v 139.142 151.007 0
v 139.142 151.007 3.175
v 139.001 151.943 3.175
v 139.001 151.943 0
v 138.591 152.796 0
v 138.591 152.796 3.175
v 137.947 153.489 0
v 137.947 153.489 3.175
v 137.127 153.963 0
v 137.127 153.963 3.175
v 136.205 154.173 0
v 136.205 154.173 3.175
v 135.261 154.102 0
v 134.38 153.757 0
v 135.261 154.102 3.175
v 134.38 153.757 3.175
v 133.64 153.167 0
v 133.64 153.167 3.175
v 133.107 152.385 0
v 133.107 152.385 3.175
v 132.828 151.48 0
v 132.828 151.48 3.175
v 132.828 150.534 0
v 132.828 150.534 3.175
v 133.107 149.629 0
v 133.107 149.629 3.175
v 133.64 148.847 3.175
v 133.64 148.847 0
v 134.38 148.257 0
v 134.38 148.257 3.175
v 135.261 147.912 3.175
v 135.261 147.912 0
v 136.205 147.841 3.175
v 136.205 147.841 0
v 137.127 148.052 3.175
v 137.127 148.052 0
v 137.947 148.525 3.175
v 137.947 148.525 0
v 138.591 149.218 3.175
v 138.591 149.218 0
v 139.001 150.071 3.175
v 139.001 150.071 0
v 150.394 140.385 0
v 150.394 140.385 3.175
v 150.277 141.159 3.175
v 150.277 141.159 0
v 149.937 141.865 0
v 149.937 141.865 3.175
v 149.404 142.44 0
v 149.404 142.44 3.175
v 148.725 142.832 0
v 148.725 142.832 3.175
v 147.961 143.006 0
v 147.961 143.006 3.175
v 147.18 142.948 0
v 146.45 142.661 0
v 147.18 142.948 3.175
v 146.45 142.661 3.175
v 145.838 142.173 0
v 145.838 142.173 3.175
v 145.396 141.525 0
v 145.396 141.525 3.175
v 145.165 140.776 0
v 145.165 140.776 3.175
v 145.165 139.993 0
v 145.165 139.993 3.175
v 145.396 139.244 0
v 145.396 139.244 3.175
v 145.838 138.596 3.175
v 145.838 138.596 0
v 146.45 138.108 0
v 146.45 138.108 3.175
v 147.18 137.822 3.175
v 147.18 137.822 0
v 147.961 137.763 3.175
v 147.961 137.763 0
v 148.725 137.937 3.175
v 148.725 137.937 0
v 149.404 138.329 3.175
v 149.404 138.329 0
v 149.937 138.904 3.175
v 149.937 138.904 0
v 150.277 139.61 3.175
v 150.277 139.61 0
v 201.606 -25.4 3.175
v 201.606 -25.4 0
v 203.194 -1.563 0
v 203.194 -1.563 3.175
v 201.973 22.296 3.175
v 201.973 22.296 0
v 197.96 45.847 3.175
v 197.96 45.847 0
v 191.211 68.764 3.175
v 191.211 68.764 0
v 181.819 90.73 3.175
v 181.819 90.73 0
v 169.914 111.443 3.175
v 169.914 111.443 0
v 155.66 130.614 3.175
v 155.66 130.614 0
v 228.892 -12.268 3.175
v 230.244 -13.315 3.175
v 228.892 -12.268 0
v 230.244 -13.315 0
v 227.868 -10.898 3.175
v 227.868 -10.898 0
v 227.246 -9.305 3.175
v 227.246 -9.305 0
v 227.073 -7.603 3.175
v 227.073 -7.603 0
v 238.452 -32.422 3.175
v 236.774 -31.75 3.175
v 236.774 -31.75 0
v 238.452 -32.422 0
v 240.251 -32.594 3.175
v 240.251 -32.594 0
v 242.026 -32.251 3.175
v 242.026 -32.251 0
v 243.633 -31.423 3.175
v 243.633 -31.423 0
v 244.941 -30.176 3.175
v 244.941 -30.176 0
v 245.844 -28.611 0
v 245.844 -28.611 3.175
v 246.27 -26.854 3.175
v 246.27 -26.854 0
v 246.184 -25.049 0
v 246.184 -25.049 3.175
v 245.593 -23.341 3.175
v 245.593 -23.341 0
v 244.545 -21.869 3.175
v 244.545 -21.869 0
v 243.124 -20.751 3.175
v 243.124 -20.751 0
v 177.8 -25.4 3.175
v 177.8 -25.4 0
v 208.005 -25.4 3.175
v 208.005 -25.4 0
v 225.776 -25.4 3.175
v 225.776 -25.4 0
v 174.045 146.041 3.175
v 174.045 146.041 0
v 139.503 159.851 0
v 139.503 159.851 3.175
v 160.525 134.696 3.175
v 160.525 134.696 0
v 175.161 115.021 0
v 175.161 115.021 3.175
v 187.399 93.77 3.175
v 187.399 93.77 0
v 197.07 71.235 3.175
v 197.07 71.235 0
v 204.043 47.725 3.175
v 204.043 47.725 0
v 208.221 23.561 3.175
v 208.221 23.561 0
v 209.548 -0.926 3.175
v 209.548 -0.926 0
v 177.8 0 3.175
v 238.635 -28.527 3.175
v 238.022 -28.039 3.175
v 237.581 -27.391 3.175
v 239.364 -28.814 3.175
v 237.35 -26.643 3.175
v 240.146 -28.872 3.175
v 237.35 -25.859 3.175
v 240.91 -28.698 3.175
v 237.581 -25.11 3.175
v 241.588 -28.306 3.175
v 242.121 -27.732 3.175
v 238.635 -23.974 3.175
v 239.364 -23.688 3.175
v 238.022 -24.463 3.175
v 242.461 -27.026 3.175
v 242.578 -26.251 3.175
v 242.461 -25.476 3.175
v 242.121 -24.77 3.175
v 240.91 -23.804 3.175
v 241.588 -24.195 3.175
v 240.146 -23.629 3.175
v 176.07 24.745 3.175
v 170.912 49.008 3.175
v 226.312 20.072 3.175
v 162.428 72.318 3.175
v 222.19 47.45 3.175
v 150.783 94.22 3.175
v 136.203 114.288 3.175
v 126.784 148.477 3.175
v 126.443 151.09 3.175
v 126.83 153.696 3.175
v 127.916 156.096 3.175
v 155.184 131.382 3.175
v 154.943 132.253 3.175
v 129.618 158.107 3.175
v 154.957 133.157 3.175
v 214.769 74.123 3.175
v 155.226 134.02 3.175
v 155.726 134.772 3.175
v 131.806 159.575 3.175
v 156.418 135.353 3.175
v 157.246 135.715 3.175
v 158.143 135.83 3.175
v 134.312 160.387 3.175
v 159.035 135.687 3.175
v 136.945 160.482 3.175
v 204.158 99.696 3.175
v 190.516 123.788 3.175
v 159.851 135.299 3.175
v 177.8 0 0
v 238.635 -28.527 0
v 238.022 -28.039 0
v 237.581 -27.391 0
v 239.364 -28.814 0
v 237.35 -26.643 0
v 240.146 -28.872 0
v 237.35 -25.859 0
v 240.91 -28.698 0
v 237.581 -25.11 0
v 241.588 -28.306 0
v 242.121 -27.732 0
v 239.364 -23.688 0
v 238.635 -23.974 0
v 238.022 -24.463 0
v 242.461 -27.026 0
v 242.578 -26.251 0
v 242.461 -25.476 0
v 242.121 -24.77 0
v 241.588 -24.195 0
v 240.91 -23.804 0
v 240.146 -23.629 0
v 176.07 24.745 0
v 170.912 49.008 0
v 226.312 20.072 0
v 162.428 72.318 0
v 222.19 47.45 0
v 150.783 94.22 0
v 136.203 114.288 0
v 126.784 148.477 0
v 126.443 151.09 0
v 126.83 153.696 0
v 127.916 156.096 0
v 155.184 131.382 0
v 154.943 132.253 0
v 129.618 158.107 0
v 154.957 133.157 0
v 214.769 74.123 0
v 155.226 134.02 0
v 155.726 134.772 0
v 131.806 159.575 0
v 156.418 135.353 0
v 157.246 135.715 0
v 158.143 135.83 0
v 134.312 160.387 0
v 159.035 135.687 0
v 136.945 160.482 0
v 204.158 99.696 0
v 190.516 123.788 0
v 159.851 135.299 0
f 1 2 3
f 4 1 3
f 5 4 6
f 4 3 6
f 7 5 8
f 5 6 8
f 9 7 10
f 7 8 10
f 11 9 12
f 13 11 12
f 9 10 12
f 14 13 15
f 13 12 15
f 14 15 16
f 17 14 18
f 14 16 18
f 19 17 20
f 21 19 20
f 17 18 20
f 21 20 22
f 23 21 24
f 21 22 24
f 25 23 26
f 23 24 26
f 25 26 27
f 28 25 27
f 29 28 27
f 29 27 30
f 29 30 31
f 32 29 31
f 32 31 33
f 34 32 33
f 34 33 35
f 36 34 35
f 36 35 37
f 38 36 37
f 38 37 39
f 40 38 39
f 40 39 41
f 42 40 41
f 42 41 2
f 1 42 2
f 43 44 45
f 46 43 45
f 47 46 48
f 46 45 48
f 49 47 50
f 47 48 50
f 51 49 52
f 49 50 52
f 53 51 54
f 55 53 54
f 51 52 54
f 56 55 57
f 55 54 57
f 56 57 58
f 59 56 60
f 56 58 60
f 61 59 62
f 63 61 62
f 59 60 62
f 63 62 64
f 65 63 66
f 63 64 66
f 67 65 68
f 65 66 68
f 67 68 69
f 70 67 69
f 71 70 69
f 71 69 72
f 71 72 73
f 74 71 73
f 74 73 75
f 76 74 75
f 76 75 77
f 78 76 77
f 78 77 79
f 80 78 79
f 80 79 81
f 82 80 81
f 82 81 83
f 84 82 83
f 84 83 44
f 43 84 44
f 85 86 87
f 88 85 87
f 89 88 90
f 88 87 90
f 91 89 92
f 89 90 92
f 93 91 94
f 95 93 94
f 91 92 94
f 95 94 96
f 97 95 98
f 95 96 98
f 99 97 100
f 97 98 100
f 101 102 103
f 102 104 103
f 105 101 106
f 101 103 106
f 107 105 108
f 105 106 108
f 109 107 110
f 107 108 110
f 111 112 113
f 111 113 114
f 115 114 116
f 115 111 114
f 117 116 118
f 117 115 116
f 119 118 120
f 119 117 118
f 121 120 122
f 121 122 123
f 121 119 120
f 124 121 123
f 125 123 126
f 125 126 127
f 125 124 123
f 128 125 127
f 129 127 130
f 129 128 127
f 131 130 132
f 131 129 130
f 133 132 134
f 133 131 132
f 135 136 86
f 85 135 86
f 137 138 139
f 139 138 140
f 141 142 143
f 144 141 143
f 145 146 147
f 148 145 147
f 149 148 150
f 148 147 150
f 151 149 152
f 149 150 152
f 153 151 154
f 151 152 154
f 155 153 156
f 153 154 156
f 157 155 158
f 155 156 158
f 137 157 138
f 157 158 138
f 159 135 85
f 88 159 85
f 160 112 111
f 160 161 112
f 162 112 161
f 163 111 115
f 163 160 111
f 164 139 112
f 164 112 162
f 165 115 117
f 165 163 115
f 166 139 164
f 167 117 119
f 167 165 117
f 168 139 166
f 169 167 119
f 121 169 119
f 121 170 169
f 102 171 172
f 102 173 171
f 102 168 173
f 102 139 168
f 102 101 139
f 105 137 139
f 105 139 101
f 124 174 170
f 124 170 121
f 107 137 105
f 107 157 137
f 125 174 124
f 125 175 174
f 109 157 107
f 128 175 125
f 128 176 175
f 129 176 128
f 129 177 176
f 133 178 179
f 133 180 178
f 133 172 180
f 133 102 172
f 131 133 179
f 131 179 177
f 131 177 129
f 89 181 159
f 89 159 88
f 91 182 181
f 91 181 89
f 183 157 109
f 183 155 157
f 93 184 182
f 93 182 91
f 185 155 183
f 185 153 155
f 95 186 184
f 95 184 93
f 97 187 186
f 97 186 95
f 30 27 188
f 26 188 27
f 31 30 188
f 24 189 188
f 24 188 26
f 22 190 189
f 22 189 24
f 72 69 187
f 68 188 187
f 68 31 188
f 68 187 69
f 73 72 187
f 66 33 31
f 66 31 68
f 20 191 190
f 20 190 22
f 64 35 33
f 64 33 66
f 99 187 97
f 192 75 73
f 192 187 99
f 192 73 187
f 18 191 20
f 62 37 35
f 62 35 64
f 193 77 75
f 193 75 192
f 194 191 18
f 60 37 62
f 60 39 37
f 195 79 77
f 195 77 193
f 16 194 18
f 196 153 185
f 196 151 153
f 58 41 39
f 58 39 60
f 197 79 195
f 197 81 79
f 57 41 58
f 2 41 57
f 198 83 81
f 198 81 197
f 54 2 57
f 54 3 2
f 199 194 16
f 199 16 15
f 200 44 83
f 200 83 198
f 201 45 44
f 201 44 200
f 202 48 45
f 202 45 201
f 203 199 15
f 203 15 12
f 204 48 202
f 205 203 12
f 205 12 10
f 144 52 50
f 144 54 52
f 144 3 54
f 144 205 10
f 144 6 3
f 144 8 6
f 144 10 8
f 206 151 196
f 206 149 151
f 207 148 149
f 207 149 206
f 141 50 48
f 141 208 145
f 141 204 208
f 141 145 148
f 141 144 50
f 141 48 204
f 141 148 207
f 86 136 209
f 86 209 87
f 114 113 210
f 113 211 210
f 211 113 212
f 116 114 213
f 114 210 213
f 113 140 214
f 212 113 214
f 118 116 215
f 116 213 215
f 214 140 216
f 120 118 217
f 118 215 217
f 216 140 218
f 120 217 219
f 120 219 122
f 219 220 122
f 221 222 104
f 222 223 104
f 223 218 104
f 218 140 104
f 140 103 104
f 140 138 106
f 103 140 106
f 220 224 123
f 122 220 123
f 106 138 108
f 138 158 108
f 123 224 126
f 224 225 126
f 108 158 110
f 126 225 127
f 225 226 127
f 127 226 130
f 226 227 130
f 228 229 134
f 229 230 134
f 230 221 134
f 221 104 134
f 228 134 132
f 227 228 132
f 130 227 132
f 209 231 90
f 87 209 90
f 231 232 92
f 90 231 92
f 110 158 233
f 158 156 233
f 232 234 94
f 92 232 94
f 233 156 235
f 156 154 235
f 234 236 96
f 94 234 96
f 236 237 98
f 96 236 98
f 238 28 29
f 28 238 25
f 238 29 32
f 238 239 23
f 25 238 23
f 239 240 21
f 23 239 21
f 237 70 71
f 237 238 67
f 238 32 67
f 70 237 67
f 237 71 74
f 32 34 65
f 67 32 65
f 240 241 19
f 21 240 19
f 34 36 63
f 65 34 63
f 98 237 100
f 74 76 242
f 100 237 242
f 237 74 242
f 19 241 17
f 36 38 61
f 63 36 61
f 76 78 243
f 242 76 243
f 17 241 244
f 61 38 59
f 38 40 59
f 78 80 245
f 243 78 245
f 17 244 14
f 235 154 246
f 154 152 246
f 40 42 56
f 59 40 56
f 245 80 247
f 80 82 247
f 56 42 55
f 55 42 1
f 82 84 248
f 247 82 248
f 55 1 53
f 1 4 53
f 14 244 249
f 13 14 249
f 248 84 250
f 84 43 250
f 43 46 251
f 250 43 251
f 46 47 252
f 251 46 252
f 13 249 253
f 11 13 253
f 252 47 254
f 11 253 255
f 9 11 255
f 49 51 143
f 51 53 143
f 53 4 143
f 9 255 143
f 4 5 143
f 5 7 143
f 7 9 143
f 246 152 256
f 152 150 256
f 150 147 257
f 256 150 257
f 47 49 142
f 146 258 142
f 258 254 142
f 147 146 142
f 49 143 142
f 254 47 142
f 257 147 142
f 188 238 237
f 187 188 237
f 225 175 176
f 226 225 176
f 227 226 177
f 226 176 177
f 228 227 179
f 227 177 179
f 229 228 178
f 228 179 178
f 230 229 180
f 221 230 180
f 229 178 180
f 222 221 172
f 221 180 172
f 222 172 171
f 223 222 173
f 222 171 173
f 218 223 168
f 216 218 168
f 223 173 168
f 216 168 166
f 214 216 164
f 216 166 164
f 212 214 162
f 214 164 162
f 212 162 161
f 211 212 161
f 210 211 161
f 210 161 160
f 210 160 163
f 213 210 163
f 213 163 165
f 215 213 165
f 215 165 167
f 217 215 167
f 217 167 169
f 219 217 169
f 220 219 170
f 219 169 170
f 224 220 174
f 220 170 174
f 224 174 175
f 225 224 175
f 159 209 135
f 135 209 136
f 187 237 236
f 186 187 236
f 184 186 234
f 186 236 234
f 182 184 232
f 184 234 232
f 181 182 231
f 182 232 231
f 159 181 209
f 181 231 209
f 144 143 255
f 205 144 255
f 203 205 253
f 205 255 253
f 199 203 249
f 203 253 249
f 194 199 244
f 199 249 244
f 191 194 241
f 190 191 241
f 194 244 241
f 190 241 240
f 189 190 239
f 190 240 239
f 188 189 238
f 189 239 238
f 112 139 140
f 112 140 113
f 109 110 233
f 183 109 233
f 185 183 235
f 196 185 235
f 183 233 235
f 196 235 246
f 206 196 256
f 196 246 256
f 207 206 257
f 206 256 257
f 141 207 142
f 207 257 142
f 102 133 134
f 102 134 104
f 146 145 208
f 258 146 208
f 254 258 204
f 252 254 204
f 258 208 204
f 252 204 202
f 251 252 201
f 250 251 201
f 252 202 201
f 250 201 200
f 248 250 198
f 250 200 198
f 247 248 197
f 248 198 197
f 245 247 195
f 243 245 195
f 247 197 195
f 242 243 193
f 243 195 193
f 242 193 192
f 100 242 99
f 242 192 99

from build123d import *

# Parameters (mm, degrees)
COPIED_SKETCH_DONT_MESS_WITH_DEPTH = 3.175
SKETCH3_R                          = 3.175
HOLE_FOR_TOP_SUPPORT_BRACING_DEPTH = 4.175
SKETCH4_R                          = 3.175
MAKING_IT_MACHINABLE_DEPTH         = 4.175
SKETCH5_R                          = 2.6289
THING_FOR_HARDSTOP_DEPTH           = 3.175
FILLET1_R                          = 6.35
SKETCH6_R                          = 2.6289
CUT_EXTRUDE1_DEPTH                 = 4.175


with BuildPart() as part:
    # Sketch2 → Copied sketch - dont mess with (new body)
    with BuildSketch(Plane.XY):
        with BuildLine():
            Line((155.660230842, 130.614442288), (160.524613056, 134.69614361))
            ThreePointArc((160.524613056, 134.69614361), (200.900960932, 59.581930119), (208.004909798, -25.4))
            Line((208.004909798, -25.4), (225.775729431, -25.4))
            ThreePointArc((225.775729431, -25.4), (217.513785946, 65.632255207), (174.045297477, 146.041344921))
            Line((174.045297477, 146.041344921), (139.503343029, 159.851365822))
            ThreePointArc((139.503343029, 159.851365822), (129.618020291, 158.107153482), (126.784391338, 148.47738561))
            Line((126.784391338, 148.47738561), (136.202701987, 114.287637002))
            ThreePointArc((136.202701987, 114.287637002), (167.077347976, 60.811181483), (177.8, 0))
            Line((177.8, 0), (177.8, -25.4))
            Line((177.8, -25.4), (201.606249903, -25.4))
            ThreePointArc((201.606249903, -25.4), (194.922962004, 57.404519712), (155.660230842, 130.614442288))
        make_face()
    extrude(amount=COPIED_SKETCH_DONT_MESS_WITH_DEPTH)

    # Sketch3 → Hole for top support bracing (cut, through all)
    with BuildSketch(Plane.XY.offset(3.175)):
        with Locations((135.967339212, 151.007028537)):
            Circle(SKETCH3_R)
    extrude(amount=-HOLE_FOR_TOP_SUPPORT_BRACING_DEPTH, mode=Mode.SUBTRACT)

    # Sketch4 → Making it machinable (cut, through all)
    with BuildSketch(Plane.XY.offset(3.175)):
        with Locations((158.092421949, 132.655292949)):
            Circle(SKETCH4_R)
    extrude(amount=-MAKING_IT_MACHINABLE_DEPTH, mode=Mode.SUBTRACT)

    # Sketch5 → Thing for hardstop (add)
    with BuildSketch(Plane.XY.offset(3.175)):
        with BuildLine():
            Line((225.775729431, -25.4), (236.774252059, -31.75))
            ThreePointArc((236.774252059, -31.75), (245.448513373, -29.425738686), (243.124252059, -20.751477372))
            Line((243.124252059, -20.751477372), (226.914188257, -11.392592672))
            ThreePointArc((226.914188257, -11.392592672), (226.453289353, -18.405100951), (225.775729431, -25.4))
        make_face()
        with Locations((239.949252059, -26.250738686)):
            Circle(SKETCH5_R, mode=Mode.SUBTRACT)
    extrude(amount=-THING_FOR_HARDSTOP_DEPTH)

    # Fillet1
    fillet1_edges = [part.edges().sort_by_distance(p)[0] for p in [
        (226.914188257, -11.392592672, 1.5875),
    ]]
    fillet(fillet1_edges, radius=FILLET1_R)

    # Sketch6 → Cut-Extrude1 (cut, through all)
    with BuildSketch(Plane.XY.offset(3.175)):
        with Locations((147.764763317, 140.384580161)):
            Circle(SKETCH6_R)
    extrude(amount=-CUT_EXTRUDE1_DEPTH, mode=Mode.SUBTRACT)


solid = part.part
